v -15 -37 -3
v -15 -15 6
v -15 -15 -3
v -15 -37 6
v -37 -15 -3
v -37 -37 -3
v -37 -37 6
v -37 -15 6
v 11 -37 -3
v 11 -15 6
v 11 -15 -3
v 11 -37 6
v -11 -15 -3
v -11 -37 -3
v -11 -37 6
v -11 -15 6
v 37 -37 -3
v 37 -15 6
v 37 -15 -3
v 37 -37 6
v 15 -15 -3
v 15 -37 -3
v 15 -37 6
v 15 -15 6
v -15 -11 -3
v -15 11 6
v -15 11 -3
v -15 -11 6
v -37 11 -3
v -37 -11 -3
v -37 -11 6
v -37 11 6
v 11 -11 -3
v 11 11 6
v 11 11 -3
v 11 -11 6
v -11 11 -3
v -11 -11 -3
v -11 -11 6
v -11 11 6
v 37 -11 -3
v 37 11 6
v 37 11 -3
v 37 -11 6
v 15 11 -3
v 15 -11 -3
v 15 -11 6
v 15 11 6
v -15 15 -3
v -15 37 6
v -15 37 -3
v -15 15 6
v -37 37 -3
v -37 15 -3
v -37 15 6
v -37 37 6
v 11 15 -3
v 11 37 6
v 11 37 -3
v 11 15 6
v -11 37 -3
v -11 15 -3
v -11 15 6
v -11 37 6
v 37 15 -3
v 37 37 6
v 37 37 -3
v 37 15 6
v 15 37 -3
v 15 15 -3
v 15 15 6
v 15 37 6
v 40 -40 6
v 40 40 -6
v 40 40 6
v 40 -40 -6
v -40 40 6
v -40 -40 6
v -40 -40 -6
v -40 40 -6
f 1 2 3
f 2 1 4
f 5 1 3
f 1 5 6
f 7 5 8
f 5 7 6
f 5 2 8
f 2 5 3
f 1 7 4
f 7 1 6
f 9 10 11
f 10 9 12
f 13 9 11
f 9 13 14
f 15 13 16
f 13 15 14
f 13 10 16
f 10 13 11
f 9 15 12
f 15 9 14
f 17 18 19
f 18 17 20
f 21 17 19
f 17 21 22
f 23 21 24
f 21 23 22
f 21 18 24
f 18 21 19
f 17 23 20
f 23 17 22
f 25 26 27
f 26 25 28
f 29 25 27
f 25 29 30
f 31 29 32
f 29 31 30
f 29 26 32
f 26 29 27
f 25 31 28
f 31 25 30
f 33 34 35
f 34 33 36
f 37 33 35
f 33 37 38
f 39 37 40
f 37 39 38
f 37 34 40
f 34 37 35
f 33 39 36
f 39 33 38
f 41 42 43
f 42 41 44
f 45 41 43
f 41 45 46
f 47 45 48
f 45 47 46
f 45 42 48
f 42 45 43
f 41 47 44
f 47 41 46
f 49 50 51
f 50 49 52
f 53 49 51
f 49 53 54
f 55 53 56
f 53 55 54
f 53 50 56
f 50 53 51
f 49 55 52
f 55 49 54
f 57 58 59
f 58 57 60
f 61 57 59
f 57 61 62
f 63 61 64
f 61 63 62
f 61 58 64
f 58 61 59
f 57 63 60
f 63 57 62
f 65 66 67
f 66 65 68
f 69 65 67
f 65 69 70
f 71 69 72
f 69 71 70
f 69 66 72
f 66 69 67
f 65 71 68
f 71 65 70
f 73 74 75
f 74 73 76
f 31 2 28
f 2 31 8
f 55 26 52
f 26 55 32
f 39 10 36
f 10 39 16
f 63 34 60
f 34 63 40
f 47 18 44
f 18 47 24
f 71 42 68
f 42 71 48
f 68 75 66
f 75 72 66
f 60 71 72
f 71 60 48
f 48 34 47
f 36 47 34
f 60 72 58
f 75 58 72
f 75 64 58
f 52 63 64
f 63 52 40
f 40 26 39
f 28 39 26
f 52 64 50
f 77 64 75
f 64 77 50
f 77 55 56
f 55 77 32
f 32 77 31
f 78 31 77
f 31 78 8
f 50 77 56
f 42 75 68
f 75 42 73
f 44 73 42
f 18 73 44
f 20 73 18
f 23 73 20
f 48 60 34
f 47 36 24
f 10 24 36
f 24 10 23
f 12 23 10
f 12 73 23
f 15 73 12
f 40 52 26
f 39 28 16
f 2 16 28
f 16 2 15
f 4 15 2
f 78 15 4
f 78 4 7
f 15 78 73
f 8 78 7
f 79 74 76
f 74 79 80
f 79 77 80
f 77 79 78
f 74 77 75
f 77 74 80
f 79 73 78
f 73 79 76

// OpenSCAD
$fn = 32;

// ----------------------------------------------------------------------
// Pocket plate 80 x 80 x 12
// 3 x 3 pockets 22 mm square, 9 mm deep
// ----------------------------------------------------------------------

// --- parameters (mm) ---
thickness = 12;  // plate thickness
floor_t = 3;     // material left under each pocket
pocket = 22;     // pocket side length
pitch_x = 26;    // pocket pitch along X
pitch_y = 26;    // pocket pitch along Y
cols = 3;        // pockets per row
rows = 3;        // rows of pockets

// --- derived feature positions (mm) ---
depth = thickness - floor_t;        // = 9   pocket depth, down to the floor
span_x = (cols - 1) * pitch_x;      // = 52   distance between outer pockets
span_y = (rows - 1) * pitch_y;      // = 52   distance between outer pocket rows
origin_x = -span_x / 2;             // = -26   X of the first pocket
origin_y = -span_y / 2;             // = -26   Y of the first pocket
plate = [span_x + pocket + 6, span_y + pocket + 6, thickness];  // = [80, 80, 12]   overall size: pockets plus 3 mm of wall on each side
feature_centers = [
  [origin_x + 0 * pitch_x, origin_y + 0 * pitch_y],
  [origin_x + 1 * pitch_x, origin_y + 0 * pitch_y],
  [origin_x + 2 * pitch_x, origin_y + 0 * pitch_y],
  [origin_x + 0 * pitch_x, origin_y + 1 * pitch_y],
  [origin_x + 1 * pitch_x, origin_y + 1 * pitch_y],
  [origin_x + 2 * pitch_x, origin_y + 1 * pitch_y],
  [origin_x + 0 * pitch_x, origin_y + 2 * pitch_y],
  [origin_x + 1 * pitch_x, origin_y + 2 * pitch_y],
  [origin_x + 2 * pitch_x, origin_y + 2 * pitch_y]
];   // pocket centres, used verbatim by the cutter loop

// plate outline, then one pocket per centre in feature_centers
difference() {
  cube(plate, center = true);
  for (centre = feature_centers)
    translate([centre[0] - pocket / 2, centre[1] - pocket / 2, plate[2] / 2 - depth])
      cube([pocket, pocket, depth + 1]);  // centred on the declared pocket centre
}
